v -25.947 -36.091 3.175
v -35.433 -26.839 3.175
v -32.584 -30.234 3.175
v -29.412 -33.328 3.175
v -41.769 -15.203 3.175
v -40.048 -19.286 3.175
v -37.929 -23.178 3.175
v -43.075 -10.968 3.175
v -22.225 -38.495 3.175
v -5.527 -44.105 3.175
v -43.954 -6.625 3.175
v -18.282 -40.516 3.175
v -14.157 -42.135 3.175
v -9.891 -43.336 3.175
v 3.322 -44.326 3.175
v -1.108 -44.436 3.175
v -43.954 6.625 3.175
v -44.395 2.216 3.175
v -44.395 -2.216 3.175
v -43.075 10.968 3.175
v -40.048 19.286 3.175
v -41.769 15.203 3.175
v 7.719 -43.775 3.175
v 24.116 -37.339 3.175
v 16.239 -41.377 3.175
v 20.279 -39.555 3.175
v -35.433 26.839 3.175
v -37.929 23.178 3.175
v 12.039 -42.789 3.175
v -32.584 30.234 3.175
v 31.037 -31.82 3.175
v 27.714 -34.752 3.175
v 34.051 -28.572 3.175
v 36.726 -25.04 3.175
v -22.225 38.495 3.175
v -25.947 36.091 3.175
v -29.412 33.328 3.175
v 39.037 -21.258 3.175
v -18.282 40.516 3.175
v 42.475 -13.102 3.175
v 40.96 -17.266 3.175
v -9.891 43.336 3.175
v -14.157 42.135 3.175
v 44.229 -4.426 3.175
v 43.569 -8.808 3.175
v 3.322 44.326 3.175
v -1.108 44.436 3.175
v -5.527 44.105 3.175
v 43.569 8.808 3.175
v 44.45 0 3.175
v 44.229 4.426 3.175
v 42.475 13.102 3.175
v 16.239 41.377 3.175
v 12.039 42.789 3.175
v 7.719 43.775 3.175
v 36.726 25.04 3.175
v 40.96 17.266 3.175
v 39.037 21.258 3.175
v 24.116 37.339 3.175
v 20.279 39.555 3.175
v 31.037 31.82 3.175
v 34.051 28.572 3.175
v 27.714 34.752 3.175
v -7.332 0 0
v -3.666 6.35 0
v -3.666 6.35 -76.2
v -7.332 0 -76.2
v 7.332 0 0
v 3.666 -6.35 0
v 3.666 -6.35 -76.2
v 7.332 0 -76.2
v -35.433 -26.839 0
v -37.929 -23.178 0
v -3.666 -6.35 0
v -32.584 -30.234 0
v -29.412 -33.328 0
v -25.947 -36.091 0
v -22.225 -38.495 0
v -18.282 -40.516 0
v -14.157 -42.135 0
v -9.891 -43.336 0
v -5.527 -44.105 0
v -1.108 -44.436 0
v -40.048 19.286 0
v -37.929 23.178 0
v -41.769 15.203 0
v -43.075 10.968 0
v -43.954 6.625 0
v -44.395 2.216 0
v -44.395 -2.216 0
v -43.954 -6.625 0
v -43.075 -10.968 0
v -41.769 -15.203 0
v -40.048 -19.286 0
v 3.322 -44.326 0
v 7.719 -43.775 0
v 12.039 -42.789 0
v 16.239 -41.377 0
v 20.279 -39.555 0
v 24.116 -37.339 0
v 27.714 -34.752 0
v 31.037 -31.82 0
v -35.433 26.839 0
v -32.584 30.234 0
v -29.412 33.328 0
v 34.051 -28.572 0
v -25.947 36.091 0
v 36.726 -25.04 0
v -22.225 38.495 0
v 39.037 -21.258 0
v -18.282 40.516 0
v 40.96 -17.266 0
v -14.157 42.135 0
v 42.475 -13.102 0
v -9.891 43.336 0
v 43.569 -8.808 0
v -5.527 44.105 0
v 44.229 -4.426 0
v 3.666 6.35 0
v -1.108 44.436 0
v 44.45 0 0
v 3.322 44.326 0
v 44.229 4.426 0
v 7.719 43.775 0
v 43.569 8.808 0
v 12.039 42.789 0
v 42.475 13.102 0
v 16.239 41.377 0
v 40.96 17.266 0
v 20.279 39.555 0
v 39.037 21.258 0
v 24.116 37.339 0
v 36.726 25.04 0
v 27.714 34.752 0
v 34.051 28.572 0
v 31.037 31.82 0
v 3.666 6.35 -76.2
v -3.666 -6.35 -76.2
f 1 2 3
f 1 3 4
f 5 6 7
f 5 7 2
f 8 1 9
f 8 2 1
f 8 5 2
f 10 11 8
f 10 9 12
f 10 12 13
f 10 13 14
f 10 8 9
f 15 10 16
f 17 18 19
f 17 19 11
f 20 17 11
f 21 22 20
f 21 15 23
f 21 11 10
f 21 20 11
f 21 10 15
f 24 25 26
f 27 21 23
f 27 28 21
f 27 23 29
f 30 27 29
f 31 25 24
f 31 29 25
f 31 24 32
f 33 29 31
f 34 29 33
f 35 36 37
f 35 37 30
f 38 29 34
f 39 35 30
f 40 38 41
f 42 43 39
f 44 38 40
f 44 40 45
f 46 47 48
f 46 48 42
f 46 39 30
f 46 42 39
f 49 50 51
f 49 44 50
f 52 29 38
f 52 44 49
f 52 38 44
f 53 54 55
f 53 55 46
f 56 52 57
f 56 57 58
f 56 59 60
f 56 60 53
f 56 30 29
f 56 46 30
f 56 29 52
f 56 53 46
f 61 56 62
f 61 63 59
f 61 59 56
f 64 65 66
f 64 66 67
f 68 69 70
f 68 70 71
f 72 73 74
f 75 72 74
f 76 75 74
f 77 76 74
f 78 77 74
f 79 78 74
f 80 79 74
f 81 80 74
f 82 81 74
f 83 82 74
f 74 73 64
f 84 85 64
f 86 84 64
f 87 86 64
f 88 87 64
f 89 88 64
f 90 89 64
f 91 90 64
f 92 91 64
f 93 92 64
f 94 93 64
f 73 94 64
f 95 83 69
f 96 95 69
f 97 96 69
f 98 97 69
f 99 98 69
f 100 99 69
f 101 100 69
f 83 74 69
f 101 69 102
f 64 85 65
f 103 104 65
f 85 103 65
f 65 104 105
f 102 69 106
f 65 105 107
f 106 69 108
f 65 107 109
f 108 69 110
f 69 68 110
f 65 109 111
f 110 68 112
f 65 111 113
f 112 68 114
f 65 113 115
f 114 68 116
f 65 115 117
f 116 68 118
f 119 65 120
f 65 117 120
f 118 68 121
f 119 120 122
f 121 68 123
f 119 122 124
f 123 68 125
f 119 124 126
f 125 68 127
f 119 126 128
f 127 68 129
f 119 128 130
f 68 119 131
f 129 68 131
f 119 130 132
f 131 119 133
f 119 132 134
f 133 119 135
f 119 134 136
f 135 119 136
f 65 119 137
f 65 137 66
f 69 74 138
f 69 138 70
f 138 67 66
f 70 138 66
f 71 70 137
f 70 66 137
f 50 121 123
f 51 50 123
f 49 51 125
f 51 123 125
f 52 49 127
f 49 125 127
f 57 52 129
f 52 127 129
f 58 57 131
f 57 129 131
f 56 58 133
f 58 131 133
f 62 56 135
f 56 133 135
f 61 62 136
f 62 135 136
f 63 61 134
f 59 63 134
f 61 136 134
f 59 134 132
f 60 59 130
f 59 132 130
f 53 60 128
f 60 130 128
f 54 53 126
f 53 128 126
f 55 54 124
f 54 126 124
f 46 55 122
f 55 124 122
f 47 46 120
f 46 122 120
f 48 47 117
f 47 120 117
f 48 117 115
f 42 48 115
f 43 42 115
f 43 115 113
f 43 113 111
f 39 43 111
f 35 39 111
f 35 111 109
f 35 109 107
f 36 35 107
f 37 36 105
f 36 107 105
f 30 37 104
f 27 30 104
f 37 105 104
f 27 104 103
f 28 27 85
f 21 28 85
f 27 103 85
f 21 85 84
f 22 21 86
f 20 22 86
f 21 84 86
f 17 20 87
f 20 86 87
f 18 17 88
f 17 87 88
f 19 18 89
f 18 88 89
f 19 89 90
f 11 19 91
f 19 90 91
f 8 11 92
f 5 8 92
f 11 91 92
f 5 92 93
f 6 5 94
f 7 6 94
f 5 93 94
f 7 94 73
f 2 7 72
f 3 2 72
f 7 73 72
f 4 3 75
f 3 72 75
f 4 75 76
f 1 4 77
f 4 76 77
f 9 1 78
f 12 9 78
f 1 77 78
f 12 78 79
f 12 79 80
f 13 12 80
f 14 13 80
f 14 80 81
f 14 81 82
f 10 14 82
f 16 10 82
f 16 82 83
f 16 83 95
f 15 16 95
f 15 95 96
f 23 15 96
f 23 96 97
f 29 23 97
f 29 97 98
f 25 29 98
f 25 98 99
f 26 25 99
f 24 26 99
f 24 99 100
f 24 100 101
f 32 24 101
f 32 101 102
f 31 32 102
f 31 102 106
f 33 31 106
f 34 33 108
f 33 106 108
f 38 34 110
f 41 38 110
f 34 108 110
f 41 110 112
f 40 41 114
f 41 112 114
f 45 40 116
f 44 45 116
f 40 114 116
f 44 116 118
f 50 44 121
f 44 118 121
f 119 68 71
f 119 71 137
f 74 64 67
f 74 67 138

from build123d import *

# Parameters (mm, degrees)
BOSS_EXTRUDE1_DEPTH = 76.2
SKETCH2_R           = 44.45
BOSS_EXTRUDE2_DEPTH = 3.175


with BuildPart() as part:
    # Sketch1 → Boss-Extrude1 (new body)
    with BuildSketch(Plane.XY):
        Polygon((7.332348419, 0), (3.666174209, 6.35), (-3.666174209, 6.35), (-7.332348419, 0), (-3.666174209, -6.35), (3.666174209, -6.35), align=None)
    extrude(amount=-BOSS_EXTRUDE1_DEPTH)

    # Sketch2 → Boss-Extrude2 (add)
    with BuildSketch(Plane.XY):
        Circle(SKETCH2_R)
    extrude(amount=BOSS_EXTRUDE2_DEPTH)


solid = part.part
